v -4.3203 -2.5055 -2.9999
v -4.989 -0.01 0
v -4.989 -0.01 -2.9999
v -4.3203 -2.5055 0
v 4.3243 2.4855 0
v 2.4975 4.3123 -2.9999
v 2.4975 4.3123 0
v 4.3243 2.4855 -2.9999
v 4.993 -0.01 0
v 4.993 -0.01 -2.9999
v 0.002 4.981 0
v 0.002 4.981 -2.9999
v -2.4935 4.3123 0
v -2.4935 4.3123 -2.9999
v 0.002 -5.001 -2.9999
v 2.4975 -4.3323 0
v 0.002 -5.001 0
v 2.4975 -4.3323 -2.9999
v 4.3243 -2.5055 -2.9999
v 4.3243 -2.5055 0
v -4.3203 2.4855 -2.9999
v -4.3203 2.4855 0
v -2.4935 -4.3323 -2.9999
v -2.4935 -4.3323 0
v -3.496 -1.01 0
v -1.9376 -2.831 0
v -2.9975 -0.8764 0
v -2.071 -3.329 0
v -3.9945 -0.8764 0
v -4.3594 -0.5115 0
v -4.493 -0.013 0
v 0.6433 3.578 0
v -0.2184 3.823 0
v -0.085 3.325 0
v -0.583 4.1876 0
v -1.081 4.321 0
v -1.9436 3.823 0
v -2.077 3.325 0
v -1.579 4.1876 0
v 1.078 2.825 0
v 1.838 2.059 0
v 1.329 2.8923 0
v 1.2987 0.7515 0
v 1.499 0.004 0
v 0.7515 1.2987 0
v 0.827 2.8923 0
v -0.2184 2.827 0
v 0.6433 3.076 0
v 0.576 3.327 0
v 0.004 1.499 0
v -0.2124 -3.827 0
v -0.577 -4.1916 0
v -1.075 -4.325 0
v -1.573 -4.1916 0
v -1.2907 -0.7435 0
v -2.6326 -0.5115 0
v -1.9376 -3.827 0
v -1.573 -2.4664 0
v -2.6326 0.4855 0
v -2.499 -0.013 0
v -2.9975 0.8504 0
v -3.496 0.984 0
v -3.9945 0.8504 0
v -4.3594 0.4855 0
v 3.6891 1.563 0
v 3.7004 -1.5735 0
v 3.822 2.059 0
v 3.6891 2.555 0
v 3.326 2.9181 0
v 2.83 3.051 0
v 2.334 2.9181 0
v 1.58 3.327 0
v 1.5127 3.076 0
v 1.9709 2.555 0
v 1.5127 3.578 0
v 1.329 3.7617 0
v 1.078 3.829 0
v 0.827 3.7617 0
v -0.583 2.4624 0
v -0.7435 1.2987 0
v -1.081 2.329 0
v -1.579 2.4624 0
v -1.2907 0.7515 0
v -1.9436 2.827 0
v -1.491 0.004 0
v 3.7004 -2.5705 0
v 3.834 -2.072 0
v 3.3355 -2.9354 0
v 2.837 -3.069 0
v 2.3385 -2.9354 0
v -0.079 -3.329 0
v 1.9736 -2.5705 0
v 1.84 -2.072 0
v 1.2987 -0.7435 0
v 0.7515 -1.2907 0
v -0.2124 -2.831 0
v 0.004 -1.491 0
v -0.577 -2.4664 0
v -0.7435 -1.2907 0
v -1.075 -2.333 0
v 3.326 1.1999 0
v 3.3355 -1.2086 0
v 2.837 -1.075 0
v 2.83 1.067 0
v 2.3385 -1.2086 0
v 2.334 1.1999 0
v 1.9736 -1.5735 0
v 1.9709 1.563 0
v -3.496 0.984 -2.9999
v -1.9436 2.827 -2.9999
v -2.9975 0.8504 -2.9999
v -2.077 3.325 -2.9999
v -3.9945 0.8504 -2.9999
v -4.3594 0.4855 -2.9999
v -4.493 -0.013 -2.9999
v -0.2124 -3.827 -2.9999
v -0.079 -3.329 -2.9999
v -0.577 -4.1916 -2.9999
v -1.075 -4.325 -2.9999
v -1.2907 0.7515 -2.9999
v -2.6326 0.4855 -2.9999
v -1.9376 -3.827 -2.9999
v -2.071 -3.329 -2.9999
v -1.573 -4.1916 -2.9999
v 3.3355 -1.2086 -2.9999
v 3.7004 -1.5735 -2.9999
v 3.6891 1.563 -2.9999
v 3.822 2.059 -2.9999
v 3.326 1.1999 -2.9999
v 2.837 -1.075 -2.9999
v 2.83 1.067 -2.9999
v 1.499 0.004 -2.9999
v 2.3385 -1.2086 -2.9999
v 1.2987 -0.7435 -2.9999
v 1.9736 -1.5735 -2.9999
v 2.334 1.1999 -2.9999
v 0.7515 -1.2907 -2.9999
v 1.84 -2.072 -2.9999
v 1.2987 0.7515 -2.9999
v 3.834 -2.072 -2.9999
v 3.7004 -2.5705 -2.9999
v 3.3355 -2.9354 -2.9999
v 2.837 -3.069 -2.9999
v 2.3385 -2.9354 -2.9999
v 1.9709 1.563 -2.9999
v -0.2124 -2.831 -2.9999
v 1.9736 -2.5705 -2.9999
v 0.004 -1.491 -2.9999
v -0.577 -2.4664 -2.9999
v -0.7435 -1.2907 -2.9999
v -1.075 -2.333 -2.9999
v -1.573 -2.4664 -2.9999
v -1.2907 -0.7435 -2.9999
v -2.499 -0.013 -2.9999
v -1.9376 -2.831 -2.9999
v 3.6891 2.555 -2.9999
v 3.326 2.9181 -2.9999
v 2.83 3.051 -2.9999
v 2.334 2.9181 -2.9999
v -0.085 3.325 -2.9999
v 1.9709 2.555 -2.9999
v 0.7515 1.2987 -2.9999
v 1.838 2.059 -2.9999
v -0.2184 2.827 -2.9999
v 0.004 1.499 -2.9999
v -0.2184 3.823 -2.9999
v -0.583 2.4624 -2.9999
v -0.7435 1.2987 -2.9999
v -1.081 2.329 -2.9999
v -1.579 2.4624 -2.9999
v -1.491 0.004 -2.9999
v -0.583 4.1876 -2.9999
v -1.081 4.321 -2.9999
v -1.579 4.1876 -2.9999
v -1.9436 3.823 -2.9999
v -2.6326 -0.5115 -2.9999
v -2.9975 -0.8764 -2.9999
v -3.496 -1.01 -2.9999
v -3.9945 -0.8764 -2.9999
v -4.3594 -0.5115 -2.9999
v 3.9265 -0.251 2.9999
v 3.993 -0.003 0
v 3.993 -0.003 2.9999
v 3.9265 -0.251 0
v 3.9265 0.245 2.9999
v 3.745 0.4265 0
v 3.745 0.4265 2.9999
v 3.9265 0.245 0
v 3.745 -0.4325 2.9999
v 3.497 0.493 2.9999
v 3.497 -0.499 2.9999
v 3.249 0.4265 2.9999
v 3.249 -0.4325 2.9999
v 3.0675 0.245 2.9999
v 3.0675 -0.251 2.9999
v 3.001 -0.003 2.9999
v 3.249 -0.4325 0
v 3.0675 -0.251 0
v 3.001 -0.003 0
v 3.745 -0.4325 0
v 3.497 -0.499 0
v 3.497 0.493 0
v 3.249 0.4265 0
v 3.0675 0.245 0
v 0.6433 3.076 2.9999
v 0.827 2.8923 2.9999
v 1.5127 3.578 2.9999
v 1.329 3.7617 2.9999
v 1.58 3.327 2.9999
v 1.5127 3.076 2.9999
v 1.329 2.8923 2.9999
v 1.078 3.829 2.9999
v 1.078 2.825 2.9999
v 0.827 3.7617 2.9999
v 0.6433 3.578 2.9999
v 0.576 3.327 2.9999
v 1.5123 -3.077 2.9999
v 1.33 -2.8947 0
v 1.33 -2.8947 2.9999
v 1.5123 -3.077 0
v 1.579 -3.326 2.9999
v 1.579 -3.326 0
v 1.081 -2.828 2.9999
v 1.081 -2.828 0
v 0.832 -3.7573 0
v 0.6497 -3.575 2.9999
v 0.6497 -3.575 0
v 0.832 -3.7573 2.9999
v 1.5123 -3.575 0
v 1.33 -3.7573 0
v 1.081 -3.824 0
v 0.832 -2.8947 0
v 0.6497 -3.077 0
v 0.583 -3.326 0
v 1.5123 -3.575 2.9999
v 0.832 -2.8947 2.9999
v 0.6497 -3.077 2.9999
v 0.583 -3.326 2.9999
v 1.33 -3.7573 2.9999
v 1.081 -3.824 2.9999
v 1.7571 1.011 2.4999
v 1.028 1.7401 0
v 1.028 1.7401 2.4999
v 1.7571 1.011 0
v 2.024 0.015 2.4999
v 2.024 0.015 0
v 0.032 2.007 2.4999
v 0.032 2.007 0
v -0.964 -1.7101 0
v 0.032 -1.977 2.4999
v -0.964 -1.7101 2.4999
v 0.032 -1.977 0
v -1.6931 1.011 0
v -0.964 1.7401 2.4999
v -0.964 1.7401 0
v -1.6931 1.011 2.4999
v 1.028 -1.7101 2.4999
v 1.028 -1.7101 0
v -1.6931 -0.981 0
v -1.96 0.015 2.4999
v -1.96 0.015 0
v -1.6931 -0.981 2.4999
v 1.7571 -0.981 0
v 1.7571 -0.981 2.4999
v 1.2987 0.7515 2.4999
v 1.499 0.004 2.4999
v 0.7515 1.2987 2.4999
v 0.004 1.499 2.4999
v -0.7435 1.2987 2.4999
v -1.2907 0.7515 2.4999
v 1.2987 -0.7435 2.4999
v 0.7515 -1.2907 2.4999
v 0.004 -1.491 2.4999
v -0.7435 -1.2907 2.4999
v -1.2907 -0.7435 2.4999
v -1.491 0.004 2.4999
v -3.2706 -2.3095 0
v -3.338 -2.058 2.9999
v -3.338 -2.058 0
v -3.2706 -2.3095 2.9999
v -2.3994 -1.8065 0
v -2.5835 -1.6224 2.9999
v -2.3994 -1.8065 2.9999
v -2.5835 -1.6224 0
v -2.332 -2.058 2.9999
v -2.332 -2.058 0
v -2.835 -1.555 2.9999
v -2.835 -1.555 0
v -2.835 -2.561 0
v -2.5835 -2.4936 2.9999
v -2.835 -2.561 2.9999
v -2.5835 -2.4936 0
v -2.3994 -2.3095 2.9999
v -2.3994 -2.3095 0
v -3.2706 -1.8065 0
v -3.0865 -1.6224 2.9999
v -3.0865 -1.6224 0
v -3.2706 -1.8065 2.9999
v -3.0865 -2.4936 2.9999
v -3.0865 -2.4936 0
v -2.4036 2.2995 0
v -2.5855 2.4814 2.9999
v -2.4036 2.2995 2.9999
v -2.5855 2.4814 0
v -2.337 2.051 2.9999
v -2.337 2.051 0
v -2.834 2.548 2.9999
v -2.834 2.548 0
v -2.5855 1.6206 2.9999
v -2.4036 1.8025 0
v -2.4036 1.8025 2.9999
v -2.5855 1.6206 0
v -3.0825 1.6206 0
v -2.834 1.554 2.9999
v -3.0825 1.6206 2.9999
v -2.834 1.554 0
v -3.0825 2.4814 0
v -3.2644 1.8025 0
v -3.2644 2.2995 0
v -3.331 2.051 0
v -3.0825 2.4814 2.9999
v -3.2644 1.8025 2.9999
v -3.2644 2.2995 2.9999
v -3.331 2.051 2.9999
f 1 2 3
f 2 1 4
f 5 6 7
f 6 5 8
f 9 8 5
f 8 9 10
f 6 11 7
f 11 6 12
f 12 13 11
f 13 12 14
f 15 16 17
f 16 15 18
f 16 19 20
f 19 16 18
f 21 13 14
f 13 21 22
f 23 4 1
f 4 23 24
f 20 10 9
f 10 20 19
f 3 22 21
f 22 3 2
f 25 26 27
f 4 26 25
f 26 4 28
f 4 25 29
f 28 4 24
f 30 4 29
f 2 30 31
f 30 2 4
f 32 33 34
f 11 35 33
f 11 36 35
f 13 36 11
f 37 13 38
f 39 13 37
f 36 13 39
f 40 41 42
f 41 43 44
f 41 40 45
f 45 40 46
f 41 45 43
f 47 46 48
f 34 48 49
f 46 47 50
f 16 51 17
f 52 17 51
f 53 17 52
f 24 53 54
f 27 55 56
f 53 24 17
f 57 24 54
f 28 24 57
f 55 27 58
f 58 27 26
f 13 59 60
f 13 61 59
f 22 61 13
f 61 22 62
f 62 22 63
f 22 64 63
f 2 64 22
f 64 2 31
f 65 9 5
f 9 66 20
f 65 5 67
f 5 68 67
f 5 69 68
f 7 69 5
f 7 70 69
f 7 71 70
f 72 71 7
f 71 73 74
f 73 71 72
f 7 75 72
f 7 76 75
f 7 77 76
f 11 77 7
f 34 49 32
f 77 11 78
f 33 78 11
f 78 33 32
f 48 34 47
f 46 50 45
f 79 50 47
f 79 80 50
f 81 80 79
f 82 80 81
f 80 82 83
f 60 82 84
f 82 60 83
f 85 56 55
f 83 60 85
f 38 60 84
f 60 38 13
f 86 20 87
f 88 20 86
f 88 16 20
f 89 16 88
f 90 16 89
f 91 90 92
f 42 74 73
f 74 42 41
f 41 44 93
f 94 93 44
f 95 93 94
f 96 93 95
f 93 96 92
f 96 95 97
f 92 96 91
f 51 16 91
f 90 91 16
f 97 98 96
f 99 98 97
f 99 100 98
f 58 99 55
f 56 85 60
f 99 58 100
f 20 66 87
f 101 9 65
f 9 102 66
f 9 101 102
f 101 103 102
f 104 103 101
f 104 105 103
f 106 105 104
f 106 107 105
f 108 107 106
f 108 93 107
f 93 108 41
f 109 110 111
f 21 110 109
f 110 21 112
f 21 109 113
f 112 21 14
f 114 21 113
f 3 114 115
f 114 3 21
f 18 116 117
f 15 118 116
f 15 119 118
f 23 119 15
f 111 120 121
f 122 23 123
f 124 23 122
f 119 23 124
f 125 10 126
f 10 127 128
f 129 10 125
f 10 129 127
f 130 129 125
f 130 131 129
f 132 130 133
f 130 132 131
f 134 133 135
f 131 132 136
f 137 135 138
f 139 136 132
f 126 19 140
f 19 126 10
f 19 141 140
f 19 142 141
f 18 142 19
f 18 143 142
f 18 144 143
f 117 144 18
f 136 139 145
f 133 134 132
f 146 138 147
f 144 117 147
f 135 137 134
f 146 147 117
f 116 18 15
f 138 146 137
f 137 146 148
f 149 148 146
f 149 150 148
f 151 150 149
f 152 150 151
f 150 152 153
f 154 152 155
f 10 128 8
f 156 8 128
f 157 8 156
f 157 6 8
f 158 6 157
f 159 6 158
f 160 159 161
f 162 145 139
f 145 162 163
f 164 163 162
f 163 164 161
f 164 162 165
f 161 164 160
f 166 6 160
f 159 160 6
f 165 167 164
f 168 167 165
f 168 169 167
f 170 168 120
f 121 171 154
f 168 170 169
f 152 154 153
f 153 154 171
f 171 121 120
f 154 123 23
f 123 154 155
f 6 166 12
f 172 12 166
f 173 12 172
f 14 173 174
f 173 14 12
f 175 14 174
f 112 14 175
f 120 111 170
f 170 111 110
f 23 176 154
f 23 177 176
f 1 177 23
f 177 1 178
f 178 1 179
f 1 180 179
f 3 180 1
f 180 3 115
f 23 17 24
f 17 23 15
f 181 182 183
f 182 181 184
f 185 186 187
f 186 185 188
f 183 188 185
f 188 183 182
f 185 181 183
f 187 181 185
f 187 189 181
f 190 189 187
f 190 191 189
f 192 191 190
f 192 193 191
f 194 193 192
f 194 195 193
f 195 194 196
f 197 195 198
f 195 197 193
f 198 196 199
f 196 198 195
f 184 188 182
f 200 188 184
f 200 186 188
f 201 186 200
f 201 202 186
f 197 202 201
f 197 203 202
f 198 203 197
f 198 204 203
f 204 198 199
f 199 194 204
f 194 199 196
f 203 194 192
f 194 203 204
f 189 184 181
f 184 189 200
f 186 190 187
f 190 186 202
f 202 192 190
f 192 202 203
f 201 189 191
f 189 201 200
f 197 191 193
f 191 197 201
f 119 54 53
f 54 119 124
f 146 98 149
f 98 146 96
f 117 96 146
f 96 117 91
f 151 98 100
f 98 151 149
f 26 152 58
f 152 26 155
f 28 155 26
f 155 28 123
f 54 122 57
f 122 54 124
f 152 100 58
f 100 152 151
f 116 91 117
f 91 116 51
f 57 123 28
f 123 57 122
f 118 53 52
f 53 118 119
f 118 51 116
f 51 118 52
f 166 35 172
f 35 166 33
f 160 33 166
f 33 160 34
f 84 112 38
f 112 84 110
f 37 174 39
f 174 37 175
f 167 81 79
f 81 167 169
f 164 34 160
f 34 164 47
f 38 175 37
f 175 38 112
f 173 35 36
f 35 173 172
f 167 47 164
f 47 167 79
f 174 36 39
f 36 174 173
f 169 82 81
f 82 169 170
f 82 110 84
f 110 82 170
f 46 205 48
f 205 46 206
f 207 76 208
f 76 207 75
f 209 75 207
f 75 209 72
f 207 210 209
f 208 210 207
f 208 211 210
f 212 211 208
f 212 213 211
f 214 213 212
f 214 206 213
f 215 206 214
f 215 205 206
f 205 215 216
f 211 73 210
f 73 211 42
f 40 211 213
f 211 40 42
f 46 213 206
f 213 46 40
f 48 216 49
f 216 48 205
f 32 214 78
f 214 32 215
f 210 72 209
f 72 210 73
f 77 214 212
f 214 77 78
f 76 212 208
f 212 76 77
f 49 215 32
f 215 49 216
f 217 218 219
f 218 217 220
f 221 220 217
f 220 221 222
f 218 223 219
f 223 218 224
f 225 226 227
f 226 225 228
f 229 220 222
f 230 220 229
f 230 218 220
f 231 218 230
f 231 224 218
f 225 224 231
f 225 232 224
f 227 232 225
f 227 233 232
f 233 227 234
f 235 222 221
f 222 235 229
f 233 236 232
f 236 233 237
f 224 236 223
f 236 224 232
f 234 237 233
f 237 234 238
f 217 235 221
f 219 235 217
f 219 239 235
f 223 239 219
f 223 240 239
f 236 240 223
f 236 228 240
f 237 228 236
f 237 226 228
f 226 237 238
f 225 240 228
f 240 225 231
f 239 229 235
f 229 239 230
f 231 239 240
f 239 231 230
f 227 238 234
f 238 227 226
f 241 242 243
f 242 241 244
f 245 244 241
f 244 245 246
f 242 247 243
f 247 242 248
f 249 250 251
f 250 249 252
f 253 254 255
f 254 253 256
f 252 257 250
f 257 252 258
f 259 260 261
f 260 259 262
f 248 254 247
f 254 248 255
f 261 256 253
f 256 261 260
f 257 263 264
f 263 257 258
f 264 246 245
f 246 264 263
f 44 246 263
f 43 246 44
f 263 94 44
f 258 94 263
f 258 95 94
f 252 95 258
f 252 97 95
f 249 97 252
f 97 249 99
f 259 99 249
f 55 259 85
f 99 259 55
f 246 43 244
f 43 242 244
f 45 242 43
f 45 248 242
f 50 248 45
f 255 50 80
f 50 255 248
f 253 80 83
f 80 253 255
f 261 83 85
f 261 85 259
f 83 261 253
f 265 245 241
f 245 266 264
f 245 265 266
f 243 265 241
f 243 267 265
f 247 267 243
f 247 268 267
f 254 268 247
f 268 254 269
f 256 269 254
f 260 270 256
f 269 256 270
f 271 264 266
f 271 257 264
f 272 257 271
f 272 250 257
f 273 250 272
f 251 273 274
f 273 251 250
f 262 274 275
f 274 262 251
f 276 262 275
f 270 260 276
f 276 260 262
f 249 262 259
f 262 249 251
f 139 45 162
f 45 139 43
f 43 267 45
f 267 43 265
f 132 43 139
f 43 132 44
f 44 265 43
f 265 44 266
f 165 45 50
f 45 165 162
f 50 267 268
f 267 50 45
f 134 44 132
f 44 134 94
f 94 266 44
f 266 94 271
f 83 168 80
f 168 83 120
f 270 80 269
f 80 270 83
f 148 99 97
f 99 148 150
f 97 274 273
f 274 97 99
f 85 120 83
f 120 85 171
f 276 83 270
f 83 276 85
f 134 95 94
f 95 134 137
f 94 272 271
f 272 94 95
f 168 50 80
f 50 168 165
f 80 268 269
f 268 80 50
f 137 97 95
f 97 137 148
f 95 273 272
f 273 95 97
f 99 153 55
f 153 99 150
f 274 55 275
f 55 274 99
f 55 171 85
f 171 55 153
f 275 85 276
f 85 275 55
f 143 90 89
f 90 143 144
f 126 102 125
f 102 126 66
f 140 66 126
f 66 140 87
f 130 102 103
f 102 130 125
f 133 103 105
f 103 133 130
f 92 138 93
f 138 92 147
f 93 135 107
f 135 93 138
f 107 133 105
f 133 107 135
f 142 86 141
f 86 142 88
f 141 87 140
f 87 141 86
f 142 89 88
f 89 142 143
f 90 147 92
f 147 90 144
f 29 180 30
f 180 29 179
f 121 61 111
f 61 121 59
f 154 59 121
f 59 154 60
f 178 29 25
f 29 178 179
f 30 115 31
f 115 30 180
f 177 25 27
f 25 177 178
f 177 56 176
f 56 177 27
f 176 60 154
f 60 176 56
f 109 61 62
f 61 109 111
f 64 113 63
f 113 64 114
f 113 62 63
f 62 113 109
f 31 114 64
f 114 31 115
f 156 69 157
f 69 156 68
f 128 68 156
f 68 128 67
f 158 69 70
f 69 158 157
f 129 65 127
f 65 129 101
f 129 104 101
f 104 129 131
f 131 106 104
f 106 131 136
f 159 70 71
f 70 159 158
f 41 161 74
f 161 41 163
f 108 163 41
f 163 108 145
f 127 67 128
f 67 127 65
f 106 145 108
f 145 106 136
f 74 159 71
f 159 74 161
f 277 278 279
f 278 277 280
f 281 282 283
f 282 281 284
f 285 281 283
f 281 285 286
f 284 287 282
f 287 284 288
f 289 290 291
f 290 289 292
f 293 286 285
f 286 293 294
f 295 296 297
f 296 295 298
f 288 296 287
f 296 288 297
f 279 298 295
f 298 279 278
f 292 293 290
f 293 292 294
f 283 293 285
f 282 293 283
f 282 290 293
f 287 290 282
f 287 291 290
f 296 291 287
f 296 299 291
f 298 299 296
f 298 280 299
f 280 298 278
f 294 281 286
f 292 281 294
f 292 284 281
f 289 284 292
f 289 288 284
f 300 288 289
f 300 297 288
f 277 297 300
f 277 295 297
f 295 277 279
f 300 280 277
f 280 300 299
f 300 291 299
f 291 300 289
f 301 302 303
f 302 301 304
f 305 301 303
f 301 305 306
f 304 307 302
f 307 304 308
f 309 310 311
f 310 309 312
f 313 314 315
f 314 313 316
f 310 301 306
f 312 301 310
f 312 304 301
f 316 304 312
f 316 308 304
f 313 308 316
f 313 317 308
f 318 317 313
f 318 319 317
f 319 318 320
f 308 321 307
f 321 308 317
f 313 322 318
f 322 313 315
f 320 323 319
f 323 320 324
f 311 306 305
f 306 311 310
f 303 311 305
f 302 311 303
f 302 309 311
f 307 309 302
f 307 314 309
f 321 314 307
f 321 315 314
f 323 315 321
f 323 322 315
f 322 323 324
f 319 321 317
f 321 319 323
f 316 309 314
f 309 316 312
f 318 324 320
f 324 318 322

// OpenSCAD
intersection() {
  cube(size = [11.9999, 11.9999, 7.1999], center = true);

  union() {
    difference() {
      union() {
        translate([1.078, 3.327, 0])
        cylinder(h = 5.9999, r1 = 0.502, r2 = 0.502, center = true, $fn = 12);
      
        difference() {
          union() {
            translate([0.002, -0.01, -1.5])
            cylinder(h = 2.9999, r1 = 4.991, r2 = 4.991, center = true, $fn = 12);
          
            translate([3.497, -0.003, 1.5])
            cylinder(h = 2.9999, r1 = 0.496, r2 = 0.496, center = true, $fn = 12);
          }
        
          union() {
            translate([-1.075, -3.329, 0])
            cylinder(h = 38, r1 = 0.996, r2 = 0.996, center = true, $fn = 12);
          
            translate([-1.081, 3.325, 0])
            cylinder(h = 38, r1 = 0.996, r2 = 0.996, center = true, $fn = 12);
          }
        }
      
        translate([1.081, -3.326, 1.5])
        cylinder(h = 2.9999, r1 = 0.498, r2 = 0.498, center = true, $fn = 12);
      
        translate([0.032, 0.015, 1.25])
        cylinder(h = 2.4999, r1 = 1.992, r2 = 1.992, center = true, $fn = 12);
      }
    
      union() {
        translate([0.004, 0.004, -0.25])
        cylinder(h = 5.5, r1 = 1.495, r2 = 1.495, center = true, $fn = 12);
      
        translate([2.837, -2.072, 8])
        cylinder(h = 22, r1 = 0.997, r2 = 0.997, center = true, $fn = 12);
      
        translate([-3.496, -0.013, 8])
        cylinder(h = 22, r1 = 0.997, r2 = 0.997, center = true, $fn = 12);
      
        translate([2.83, 2.059, -1.5])
        cylinder(h = 3, r1 = 0.992, r2 = 0.992, center = true, $fn = 12);
      }
    }
  
    translate([-2.835, -2.058, 1.5])
    cylinder(h = 2.9999, r1 = 0.503, r2 = 0.503, center = true, $fn = 12);
  
    translate([-2.834, 2.051, 1.5])
    cylinder(h = 2.9999, r1 = 0.497, r2 = 0.497, center = true, $fn = 12);
  }
}
